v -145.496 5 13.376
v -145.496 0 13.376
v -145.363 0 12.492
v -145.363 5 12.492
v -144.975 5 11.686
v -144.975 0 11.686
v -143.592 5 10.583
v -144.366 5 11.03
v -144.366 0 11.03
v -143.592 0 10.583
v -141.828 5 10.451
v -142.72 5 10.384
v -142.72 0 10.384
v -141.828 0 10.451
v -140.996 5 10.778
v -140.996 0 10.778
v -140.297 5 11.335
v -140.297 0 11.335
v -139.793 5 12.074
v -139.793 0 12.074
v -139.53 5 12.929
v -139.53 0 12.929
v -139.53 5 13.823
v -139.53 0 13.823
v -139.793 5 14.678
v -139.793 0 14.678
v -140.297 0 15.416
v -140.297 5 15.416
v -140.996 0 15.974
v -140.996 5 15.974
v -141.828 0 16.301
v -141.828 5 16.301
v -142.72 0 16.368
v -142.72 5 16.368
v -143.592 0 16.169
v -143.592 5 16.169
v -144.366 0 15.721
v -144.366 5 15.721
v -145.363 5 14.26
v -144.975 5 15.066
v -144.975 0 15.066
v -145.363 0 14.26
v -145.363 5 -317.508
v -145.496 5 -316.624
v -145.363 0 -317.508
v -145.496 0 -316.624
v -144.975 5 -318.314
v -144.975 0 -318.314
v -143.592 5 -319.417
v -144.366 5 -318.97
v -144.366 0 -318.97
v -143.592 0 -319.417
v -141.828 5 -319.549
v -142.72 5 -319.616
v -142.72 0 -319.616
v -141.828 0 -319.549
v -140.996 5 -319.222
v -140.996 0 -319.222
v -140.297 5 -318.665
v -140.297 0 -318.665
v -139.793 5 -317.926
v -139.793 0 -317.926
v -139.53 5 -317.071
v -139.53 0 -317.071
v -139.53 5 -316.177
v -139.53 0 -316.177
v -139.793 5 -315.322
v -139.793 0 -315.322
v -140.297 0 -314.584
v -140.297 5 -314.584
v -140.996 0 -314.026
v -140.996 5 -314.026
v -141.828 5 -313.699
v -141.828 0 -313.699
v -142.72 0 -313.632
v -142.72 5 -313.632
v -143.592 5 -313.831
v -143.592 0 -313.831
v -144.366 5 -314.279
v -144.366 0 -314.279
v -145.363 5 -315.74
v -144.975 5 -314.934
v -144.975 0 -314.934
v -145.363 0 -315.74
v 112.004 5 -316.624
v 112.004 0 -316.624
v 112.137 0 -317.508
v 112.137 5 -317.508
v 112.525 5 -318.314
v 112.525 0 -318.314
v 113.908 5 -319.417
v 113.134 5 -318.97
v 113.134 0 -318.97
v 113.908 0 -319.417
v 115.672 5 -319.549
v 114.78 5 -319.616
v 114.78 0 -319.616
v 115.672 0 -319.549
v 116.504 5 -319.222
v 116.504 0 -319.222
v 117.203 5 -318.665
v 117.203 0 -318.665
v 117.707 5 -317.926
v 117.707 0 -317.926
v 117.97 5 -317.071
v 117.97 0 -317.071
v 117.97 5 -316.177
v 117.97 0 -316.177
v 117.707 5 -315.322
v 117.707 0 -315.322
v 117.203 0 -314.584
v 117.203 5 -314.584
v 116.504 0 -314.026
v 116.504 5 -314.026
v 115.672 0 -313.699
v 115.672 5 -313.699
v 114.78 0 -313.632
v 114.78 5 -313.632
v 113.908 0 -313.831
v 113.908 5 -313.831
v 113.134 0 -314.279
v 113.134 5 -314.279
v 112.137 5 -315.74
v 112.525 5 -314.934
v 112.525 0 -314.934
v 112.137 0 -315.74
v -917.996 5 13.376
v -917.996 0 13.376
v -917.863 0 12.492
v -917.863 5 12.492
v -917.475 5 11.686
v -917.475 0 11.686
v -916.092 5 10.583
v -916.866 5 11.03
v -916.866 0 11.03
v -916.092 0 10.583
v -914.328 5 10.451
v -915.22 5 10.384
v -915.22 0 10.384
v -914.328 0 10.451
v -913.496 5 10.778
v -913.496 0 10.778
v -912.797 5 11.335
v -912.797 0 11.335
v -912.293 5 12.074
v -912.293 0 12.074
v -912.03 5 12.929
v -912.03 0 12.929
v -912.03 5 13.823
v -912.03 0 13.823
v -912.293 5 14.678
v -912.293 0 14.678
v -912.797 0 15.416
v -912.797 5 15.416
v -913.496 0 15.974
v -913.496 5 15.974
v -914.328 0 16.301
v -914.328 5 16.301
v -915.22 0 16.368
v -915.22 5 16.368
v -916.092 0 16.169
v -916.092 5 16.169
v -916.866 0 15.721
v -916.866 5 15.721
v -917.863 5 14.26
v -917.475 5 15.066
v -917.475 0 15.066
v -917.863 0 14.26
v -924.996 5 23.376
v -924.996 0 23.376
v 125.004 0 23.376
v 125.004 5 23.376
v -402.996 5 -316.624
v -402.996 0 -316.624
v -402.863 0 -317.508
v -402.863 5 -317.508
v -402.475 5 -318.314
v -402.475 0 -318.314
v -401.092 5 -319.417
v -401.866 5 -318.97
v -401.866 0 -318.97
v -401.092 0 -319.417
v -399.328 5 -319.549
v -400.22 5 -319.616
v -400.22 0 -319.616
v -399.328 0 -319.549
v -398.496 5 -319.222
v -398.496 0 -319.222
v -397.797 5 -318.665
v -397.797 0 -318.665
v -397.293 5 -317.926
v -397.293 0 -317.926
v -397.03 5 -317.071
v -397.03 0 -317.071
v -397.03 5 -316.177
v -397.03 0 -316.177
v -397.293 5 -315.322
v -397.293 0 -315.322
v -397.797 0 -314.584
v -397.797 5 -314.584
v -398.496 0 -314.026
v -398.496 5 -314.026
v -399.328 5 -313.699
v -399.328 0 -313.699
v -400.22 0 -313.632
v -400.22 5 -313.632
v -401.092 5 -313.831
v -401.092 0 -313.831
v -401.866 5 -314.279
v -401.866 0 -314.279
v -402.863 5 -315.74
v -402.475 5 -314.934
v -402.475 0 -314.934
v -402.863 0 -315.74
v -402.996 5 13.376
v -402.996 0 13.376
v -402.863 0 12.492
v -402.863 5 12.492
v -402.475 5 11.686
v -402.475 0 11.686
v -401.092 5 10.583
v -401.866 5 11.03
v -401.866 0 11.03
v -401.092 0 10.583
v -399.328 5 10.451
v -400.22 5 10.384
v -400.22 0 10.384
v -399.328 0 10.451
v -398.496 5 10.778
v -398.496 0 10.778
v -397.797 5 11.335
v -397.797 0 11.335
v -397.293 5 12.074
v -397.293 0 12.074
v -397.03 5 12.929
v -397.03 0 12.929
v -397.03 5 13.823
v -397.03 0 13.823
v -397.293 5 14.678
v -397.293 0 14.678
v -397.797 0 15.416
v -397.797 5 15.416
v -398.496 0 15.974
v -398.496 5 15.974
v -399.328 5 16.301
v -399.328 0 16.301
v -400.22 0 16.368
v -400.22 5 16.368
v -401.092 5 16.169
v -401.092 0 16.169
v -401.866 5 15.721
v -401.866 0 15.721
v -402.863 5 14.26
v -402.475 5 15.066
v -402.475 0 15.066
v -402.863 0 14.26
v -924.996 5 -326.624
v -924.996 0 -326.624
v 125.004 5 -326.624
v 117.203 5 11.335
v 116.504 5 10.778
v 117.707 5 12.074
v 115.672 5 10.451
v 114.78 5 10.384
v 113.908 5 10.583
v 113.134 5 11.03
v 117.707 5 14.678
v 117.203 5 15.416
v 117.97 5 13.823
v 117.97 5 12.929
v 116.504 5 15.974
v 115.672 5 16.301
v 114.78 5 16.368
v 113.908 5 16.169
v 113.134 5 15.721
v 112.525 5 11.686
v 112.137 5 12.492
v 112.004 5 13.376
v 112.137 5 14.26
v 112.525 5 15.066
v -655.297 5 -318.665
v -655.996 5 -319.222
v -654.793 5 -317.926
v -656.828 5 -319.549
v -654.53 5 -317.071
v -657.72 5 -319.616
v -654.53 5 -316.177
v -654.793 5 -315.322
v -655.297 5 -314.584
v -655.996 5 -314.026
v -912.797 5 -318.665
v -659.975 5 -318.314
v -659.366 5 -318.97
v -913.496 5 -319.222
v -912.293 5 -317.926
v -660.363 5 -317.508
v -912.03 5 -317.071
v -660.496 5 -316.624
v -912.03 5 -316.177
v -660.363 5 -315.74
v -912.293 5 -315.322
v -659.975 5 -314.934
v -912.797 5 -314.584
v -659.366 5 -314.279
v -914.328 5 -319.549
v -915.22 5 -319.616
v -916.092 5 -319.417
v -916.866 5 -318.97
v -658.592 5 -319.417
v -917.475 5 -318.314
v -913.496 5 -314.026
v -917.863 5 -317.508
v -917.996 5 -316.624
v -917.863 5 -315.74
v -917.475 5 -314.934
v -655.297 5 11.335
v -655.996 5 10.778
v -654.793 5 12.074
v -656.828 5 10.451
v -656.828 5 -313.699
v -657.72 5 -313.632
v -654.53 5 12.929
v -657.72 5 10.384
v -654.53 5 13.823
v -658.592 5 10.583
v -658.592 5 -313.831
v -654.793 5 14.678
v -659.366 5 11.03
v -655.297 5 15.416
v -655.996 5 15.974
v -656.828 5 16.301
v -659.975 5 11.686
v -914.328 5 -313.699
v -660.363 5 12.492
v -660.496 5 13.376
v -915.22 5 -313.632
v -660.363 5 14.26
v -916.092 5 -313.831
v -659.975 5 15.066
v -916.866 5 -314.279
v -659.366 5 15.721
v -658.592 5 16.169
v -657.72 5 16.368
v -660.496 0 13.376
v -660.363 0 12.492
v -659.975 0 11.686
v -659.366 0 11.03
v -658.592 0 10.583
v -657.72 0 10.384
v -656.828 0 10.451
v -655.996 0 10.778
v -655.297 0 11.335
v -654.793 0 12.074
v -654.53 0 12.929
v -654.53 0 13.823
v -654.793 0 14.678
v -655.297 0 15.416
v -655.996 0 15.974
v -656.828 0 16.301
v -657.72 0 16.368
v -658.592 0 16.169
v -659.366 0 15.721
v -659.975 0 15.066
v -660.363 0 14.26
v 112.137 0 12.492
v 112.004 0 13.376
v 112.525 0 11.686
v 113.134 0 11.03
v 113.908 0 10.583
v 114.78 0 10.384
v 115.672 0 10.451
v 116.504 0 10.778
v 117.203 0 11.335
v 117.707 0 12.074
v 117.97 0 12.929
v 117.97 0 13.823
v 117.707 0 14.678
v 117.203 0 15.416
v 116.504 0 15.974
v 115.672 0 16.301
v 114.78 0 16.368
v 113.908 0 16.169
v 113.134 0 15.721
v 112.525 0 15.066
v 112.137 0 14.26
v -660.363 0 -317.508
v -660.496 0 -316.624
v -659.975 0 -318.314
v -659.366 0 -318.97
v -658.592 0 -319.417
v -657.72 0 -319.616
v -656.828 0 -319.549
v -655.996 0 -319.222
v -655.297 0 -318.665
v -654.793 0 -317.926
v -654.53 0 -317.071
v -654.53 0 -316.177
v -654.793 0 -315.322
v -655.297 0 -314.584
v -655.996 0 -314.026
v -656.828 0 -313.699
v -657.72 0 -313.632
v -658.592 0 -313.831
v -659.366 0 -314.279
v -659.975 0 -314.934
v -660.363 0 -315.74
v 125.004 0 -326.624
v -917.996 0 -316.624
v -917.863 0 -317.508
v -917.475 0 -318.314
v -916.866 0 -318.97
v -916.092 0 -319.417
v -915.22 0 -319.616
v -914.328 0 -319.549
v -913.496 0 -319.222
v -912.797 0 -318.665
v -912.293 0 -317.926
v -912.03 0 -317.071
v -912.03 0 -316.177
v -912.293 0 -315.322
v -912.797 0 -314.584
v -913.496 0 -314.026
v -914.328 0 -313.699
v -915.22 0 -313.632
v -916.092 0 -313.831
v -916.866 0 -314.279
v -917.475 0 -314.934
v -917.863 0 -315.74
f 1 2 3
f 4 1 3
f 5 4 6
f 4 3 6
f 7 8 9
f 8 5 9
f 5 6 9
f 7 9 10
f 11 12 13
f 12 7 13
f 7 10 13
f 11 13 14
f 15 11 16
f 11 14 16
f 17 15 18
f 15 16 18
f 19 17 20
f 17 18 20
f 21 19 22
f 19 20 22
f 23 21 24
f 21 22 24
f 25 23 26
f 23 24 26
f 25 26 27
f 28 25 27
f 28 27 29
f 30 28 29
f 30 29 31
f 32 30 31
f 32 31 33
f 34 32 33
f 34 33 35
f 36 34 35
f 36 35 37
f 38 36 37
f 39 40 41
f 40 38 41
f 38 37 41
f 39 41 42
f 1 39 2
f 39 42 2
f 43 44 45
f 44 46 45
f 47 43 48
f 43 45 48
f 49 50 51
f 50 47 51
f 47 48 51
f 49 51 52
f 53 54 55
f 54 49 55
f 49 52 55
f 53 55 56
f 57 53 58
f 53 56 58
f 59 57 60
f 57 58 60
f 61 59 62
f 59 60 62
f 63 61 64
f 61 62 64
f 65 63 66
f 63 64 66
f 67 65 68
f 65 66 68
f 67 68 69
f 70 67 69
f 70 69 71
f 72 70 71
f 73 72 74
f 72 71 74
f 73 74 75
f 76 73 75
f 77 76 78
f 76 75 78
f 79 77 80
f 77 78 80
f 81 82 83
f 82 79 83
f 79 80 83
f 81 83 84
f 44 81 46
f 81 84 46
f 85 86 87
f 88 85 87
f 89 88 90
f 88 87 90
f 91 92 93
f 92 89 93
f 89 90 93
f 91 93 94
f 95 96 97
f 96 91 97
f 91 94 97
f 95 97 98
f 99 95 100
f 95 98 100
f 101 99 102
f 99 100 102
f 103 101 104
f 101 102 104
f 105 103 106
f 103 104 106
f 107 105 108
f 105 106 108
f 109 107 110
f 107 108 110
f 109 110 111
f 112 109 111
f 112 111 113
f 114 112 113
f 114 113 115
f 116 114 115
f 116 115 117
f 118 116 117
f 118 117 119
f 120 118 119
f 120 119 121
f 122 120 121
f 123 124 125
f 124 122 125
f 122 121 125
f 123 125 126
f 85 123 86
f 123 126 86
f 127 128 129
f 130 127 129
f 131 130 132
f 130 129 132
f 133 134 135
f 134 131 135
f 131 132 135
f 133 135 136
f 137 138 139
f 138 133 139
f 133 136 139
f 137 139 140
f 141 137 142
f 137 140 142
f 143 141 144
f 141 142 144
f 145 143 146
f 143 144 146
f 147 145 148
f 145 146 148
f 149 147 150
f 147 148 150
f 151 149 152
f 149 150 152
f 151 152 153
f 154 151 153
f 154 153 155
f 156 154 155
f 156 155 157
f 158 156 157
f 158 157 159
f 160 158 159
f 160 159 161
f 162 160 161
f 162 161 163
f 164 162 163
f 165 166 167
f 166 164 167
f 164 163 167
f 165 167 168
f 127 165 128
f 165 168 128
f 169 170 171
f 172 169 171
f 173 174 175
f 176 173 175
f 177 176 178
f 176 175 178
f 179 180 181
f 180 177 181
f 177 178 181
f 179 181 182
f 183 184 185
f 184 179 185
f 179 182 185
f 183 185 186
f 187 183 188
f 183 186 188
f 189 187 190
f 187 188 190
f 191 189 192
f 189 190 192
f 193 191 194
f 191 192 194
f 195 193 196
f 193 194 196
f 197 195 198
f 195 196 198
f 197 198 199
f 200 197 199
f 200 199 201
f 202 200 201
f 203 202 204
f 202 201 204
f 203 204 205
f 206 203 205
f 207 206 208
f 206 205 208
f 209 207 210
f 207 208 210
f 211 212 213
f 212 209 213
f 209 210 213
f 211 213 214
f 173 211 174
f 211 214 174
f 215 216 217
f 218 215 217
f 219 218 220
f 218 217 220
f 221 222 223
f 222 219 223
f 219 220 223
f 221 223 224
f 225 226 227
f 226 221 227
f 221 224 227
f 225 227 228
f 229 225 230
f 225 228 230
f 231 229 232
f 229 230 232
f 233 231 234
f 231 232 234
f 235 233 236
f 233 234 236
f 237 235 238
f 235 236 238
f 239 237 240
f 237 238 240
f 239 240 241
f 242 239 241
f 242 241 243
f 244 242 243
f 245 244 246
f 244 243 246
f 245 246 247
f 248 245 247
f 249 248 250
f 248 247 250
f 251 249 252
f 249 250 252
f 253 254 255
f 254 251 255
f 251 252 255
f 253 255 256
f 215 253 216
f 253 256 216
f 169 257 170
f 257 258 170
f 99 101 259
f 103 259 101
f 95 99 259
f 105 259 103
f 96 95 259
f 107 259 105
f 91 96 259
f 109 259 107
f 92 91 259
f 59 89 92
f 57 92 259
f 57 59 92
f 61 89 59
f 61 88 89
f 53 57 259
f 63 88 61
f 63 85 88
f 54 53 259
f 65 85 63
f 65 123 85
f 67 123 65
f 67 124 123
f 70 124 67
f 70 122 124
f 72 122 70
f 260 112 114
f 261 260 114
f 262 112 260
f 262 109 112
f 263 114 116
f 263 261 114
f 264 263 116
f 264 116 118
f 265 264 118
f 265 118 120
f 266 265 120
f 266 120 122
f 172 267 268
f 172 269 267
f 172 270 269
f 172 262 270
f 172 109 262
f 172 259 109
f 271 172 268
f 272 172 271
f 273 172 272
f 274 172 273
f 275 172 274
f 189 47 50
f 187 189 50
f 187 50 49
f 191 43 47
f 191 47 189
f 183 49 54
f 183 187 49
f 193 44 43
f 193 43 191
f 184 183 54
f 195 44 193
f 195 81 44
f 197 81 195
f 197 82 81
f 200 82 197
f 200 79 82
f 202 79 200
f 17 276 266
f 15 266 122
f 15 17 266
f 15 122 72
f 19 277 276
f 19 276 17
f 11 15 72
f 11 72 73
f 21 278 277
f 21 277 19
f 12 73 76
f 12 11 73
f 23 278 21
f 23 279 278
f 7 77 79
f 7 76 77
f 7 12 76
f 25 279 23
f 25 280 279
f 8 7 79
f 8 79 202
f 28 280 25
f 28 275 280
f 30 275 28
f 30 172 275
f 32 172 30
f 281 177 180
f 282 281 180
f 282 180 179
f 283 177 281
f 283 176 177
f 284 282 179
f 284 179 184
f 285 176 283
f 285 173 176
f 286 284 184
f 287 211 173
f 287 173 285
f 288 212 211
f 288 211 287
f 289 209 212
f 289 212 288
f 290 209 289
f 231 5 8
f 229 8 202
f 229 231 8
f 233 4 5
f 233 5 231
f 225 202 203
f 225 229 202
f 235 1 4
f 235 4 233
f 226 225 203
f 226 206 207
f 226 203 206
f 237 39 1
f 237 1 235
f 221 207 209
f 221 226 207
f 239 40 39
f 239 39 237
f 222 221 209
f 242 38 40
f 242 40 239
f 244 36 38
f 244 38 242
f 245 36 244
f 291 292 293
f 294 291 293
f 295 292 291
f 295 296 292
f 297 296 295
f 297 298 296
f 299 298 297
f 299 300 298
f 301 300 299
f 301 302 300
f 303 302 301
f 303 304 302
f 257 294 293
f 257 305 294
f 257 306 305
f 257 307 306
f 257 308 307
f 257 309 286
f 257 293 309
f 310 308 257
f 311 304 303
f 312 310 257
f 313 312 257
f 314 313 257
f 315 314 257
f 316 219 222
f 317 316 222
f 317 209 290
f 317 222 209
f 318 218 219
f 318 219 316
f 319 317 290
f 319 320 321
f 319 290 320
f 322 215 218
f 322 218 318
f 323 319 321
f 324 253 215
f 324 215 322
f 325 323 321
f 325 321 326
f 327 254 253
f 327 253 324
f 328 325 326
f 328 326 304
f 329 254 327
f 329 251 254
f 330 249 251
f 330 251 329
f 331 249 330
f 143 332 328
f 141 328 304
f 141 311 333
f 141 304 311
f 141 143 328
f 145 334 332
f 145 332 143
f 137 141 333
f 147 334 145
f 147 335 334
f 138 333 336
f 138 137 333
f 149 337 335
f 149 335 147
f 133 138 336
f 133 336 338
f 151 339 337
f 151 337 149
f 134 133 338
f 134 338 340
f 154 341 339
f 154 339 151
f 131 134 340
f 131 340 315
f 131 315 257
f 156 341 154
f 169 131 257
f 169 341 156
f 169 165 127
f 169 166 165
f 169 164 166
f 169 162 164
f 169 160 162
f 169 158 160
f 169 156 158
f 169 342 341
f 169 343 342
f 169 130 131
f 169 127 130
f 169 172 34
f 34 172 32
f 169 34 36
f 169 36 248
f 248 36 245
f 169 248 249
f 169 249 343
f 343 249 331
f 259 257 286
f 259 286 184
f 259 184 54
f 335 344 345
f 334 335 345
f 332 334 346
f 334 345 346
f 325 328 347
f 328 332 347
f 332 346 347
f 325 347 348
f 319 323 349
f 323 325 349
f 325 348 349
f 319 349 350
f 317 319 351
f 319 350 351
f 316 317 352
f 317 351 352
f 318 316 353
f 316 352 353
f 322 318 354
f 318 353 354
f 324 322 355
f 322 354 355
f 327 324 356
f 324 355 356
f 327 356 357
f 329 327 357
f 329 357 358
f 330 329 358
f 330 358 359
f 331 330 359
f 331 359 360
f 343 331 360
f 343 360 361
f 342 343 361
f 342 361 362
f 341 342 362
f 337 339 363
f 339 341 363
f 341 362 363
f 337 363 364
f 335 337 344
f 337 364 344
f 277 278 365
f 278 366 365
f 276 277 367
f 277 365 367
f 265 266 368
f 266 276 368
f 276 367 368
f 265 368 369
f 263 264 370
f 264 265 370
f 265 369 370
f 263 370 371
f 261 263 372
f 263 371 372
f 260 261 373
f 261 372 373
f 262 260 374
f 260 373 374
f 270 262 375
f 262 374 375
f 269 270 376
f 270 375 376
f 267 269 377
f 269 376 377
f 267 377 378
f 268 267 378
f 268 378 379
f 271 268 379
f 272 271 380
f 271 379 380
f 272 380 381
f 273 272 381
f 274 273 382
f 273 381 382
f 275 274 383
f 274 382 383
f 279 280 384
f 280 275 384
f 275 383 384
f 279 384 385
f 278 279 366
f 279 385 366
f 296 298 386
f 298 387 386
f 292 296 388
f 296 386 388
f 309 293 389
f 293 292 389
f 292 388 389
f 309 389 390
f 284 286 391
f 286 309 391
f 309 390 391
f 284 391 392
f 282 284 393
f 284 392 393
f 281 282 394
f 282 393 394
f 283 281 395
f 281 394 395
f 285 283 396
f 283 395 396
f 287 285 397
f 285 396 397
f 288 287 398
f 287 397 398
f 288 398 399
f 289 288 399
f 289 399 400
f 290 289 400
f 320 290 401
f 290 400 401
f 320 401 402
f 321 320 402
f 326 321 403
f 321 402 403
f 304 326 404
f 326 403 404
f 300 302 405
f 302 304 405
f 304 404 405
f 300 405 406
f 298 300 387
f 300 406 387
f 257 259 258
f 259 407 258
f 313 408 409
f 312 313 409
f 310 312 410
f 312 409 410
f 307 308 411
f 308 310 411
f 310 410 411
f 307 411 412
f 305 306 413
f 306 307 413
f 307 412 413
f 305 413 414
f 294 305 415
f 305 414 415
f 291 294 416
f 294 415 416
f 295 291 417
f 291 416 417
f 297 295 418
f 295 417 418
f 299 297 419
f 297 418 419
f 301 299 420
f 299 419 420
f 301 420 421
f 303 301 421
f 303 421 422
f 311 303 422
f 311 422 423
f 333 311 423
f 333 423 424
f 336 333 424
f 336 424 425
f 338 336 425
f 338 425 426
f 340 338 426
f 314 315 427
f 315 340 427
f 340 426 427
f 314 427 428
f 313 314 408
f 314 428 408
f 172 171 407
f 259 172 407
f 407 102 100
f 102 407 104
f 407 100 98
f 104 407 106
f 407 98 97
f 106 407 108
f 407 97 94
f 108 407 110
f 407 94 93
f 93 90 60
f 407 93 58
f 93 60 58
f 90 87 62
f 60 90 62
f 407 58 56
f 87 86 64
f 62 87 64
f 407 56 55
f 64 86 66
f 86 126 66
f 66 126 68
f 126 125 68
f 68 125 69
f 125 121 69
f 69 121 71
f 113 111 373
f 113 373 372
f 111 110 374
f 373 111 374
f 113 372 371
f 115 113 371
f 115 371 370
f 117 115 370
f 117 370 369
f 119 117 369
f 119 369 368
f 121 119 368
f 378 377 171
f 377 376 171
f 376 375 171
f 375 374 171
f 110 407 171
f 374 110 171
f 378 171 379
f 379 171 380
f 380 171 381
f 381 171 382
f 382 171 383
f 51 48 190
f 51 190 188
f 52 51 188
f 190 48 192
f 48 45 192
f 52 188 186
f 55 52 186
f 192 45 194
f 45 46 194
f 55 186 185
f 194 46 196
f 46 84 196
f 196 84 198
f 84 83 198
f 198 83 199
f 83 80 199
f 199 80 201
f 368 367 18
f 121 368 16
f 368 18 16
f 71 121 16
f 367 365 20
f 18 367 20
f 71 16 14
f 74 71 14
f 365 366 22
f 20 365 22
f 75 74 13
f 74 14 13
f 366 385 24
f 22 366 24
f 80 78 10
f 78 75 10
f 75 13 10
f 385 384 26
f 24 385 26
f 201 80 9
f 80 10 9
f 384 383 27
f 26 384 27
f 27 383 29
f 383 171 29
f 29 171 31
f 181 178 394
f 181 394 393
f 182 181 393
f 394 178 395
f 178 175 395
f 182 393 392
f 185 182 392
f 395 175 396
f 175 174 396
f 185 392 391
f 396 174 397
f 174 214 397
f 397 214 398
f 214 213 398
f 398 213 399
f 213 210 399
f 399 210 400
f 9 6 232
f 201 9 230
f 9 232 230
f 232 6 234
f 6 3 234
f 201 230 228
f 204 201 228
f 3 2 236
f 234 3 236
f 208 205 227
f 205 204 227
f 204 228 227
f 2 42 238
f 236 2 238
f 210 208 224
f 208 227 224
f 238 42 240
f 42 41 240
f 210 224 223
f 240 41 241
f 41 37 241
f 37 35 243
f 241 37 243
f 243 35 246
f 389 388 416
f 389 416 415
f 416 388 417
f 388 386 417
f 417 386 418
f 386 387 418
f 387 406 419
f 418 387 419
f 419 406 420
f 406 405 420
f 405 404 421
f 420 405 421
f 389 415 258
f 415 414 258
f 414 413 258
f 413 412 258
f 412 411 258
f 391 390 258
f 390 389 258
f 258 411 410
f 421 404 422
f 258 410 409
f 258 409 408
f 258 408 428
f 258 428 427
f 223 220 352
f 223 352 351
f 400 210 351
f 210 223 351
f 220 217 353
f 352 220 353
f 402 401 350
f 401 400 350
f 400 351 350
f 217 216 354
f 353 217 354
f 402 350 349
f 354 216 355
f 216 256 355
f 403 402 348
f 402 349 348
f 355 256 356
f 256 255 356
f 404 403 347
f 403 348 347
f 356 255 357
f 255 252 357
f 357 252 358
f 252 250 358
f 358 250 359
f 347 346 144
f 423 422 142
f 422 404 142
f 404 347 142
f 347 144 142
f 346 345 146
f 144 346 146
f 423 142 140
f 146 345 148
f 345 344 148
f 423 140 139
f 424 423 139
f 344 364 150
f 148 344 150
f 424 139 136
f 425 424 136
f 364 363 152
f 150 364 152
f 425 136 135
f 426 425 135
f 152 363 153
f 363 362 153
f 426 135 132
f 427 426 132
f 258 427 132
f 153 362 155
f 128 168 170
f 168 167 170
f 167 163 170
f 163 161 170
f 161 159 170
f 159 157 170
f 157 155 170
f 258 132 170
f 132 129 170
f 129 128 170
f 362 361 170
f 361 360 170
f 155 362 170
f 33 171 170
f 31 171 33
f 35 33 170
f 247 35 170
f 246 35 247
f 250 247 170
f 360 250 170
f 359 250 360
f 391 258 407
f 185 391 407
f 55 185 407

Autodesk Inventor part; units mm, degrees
ref_plane "YZ Plane" through (0, 0, 0) normal (1, 0, 0) x (0, 1, 0)
ref_plane "XZ Plane" through (0, 0, 0) normal (0, 1, 0) x (-1, 0, 0)
ref_plane "XY Plane" through (0, 0, 0) normal (0, 0, 1) x (1, 0, 0)
sketch "Sketch1" plane through (0, 0, 0) normal (0, 1, 0) x (-1, 0, 0)
  line L0 (-125.004, -326.6241) -> (924.996, -326.6241) projected
  line L1 (924.996, -326.6241) -> (924.996, 23.3759) projected
  line L2 (924.996, 23.3759) -> (-125.004, 23.3759) projected
  line L3 (-125.004, 23.3759) -> (-125.004, -326.6241) projected
  line L4 (924.996, 23.3759) -> (-125.004, 23.3759) projected
  line L5 (-125.004, 23.3759) -> (-125.004, -326.6241) projected
  line L6 (-125.004, -326.6241) -> (924.996, -326.6241) projected
  line L7 (924.996, -326.6241) -> (924.996, 23.3759) projected
  line L8 (-100.004, -1.6241) -> (899.996, -1.6241) projected
  line L9 (899.996, -1.6241) -> (899.996, -301.6241) projected
  line L10 (899.996, -301.6241) -> (-100.004, -301.6241) projected
  line L11 (-100.004, -301.6241) -> (-100.004, -1.6241) projected
  circle A0 centre (399.996, -316.6241) radius 3 projected
  circle A1 centre (914.996, -316.6241) radius 3 projected
  circle A2 centre (-115.004, -316.6241) radius 3 projected
  circle A3 centre (142.496, -316.6241) radius 3 projected
  circle A4 centre (399.996, 13.3759) radius 3 projected
  circle A5 centre (142.496, 13.3759) radius 3 projected
  circle A6 centre (-115.004, 13.3759) radius 3 projected
  circle A7 centre (657.496, 13.3759) radius 3 projected
  circle A8 centre (914.996, 13.3759) radius 3 projected
  circle A9 centre (657.496, -316.6241) radius 3 projected
  point P0 (0, 0)
extrude "Extrusion1" add sketch "Sketch1" along normal blind 5 contours L3 L2 L1 L0 | L8 L9 L10 L11
properties part number "base"
